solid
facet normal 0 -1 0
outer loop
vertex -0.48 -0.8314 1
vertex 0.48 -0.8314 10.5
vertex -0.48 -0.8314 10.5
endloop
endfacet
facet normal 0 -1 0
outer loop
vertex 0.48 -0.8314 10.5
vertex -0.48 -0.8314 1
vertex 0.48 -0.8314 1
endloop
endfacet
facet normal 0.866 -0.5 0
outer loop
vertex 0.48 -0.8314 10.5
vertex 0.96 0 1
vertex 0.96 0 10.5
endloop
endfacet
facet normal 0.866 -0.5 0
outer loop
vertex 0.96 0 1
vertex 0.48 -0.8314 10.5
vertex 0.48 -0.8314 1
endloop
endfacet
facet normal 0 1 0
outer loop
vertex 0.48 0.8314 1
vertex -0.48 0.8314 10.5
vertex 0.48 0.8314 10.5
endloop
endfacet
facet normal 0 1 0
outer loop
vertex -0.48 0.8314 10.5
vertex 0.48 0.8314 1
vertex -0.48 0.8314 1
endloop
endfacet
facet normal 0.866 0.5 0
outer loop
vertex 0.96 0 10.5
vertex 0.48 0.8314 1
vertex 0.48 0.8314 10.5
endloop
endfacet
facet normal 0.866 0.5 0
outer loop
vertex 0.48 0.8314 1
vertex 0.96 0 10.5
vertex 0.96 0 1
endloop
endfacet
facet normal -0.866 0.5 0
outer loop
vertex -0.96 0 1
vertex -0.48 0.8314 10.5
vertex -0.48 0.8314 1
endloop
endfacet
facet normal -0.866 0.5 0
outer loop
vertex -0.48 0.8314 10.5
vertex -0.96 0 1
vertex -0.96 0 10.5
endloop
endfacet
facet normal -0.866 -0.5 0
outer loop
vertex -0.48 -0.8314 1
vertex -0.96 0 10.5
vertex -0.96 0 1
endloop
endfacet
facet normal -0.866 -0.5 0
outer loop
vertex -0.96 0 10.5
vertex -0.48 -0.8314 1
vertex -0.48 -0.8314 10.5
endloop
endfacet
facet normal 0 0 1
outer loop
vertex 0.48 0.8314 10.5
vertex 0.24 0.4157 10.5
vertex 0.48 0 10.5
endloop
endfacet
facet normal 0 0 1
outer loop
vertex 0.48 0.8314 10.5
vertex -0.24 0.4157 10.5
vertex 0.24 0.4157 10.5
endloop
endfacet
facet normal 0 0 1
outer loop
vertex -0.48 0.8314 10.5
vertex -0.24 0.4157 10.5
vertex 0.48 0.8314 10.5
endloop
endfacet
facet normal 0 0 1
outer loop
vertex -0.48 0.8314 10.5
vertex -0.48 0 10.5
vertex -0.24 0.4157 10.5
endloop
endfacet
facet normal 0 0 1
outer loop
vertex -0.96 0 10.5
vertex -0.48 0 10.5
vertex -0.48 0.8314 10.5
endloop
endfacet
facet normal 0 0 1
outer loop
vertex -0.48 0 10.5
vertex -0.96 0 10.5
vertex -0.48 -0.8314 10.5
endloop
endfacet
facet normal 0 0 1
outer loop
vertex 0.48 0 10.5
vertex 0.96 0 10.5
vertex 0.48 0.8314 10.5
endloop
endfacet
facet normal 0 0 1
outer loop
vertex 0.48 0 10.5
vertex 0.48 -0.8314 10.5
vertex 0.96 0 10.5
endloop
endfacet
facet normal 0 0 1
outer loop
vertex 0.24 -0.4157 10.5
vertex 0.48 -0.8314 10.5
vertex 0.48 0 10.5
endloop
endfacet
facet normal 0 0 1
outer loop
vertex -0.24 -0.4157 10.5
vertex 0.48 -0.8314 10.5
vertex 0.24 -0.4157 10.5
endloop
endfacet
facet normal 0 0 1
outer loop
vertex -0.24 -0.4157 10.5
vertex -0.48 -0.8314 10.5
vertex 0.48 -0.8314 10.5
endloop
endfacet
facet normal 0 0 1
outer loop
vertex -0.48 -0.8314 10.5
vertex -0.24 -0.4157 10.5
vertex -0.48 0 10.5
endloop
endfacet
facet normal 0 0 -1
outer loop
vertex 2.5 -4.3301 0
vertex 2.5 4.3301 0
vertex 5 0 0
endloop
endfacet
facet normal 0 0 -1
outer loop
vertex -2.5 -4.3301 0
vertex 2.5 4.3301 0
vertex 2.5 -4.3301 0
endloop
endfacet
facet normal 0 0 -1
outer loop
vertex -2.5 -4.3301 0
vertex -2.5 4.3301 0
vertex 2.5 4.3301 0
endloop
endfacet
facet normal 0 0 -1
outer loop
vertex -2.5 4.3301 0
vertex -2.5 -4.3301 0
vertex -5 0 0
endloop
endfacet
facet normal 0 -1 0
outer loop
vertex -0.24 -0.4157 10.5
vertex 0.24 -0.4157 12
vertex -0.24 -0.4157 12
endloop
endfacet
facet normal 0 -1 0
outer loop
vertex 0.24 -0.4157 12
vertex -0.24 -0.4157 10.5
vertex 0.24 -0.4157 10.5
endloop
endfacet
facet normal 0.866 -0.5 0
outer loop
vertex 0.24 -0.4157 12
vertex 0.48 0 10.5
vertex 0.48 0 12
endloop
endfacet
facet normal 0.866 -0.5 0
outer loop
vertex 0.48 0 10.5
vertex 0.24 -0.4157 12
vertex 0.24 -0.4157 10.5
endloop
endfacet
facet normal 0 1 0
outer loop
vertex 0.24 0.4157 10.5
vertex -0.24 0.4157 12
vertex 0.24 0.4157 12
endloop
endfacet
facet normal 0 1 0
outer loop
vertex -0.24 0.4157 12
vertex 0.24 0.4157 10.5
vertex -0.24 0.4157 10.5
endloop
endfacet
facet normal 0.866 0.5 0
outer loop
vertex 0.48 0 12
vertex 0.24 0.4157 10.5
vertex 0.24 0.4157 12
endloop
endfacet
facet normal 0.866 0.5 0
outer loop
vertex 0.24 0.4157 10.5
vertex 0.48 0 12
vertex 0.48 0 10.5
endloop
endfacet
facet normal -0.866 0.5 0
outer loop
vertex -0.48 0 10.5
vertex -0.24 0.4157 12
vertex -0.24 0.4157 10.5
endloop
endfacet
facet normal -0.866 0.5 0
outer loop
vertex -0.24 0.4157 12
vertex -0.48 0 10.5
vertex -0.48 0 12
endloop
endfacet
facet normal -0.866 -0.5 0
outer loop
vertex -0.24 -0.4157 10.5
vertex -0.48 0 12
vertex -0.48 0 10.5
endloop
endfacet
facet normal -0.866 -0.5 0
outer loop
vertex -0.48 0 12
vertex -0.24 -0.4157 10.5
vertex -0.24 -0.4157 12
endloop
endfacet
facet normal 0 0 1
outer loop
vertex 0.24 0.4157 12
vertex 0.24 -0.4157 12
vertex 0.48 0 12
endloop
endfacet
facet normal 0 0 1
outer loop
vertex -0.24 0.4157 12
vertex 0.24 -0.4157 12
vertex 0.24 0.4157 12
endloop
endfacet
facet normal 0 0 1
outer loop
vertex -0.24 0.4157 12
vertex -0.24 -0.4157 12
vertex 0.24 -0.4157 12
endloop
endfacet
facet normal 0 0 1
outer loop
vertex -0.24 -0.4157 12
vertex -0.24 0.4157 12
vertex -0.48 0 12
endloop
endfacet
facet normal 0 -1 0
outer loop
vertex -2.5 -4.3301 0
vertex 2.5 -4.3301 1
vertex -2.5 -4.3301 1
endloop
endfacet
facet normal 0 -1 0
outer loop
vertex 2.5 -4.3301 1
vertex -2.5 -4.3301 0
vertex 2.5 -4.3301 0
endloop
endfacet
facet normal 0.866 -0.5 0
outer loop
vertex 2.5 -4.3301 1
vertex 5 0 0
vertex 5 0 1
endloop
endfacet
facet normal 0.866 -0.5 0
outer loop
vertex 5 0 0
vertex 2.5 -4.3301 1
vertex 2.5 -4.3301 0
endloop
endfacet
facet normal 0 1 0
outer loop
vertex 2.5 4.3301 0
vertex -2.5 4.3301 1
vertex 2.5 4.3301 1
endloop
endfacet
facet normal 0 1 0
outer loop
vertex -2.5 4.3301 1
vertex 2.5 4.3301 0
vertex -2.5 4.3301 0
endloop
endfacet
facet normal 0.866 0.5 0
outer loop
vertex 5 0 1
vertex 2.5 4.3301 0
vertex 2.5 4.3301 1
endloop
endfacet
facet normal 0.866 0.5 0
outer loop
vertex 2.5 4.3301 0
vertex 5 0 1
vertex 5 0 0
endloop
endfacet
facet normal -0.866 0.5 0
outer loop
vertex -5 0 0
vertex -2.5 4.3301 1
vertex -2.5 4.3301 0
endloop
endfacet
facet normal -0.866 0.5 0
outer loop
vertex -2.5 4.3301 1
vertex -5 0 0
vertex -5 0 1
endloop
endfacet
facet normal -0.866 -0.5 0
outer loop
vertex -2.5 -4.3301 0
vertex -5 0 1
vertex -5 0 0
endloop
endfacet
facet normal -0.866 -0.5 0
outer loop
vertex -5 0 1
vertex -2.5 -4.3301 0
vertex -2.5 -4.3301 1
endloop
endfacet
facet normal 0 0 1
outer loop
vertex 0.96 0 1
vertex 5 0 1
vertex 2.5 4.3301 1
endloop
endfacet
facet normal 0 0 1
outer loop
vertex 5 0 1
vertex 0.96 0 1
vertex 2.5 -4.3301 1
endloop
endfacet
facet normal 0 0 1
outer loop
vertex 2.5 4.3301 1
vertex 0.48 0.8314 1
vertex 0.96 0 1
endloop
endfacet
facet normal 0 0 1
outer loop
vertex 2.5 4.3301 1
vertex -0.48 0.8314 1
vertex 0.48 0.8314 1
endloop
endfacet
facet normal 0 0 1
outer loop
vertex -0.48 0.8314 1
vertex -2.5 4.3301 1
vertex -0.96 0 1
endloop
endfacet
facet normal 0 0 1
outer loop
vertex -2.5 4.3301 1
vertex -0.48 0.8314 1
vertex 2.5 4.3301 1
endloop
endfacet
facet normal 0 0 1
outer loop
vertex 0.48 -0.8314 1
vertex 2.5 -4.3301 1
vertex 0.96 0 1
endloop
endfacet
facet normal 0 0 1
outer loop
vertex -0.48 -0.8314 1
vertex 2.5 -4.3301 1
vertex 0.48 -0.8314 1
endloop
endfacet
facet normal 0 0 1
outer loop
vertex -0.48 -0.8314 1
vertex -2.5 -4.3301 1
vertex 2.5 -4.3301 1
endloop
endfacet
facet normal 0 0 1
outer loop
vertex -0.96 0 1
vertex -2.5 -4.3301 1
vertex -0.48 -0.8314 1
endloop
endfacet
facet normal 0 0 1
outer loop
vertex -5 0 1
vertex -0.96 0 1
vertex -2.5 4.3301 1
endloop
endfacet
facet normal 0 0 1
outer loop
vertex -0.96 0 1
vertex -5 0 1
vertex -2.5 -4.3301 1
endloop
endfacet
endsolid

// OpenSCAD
// file: cookie_cutter.scad
// Cookie cutter generator
// Pau Fernández <pauek@minidosis.org>
// GNU GPL v2

module dxf(file, layer, height) {
   orig = dxf_cross(file = file, layer = layer);
   echo("origin: ", orig);
   translate([-orig[0], -orig[1], 0])
      linear_extrude(height = height)
         import(file = file, layer = layer);
}

module needle(height, thin1, thin2) {
   union() {
      cylinder(r = thin1, h = height-1.5, $fn = 6);
      cylinder(r = thin2, h = height, $fn = 6);
   }
}

module wall(file, layer, height, thin) {
   difference() {
      minkowski() {
        dxf(file, layer, 0.01);
        cylinder(r = thin, h = height, $fn = 6);
      }
      translate([0, 0, -1]) dxf(file, layer, height + 2);
   }
}

module cutter(file, layer, height, nozzle_diameter) {
   thin1 = nozzle_diameter * 2.4;
   thin2 = nozzle_diameter * 1.2;
   difference() {
      minkowski() {
        dxf(file, layer, 0.01);
        needle(height, thin1, thin2);
      }
      translate([0, 0, -1]) dxf(file, layer, height + 2);
   }
}

module cookie_cutter(file, height, join_height, nozzle_diameter) {
   union () {
      cutter(file, "cutter", height, nozzle_diameter);
      wall(file, "outer", 1, 5);
   }
}

module cookie_cutter_join(file, height, nozzle_diameter) {
   mirror([1, 0, 0]) union () {
      cutter(file, "cutter", height, nozzle_diameter);
      wall(file, "outer", 1.5, 5);
      dxf(file, "join", 1.5);
   }
}
// main file
include <cookie_cutter.scad>;
cookie_cutter("stripes.dxf", 12, 4, 0.4);
